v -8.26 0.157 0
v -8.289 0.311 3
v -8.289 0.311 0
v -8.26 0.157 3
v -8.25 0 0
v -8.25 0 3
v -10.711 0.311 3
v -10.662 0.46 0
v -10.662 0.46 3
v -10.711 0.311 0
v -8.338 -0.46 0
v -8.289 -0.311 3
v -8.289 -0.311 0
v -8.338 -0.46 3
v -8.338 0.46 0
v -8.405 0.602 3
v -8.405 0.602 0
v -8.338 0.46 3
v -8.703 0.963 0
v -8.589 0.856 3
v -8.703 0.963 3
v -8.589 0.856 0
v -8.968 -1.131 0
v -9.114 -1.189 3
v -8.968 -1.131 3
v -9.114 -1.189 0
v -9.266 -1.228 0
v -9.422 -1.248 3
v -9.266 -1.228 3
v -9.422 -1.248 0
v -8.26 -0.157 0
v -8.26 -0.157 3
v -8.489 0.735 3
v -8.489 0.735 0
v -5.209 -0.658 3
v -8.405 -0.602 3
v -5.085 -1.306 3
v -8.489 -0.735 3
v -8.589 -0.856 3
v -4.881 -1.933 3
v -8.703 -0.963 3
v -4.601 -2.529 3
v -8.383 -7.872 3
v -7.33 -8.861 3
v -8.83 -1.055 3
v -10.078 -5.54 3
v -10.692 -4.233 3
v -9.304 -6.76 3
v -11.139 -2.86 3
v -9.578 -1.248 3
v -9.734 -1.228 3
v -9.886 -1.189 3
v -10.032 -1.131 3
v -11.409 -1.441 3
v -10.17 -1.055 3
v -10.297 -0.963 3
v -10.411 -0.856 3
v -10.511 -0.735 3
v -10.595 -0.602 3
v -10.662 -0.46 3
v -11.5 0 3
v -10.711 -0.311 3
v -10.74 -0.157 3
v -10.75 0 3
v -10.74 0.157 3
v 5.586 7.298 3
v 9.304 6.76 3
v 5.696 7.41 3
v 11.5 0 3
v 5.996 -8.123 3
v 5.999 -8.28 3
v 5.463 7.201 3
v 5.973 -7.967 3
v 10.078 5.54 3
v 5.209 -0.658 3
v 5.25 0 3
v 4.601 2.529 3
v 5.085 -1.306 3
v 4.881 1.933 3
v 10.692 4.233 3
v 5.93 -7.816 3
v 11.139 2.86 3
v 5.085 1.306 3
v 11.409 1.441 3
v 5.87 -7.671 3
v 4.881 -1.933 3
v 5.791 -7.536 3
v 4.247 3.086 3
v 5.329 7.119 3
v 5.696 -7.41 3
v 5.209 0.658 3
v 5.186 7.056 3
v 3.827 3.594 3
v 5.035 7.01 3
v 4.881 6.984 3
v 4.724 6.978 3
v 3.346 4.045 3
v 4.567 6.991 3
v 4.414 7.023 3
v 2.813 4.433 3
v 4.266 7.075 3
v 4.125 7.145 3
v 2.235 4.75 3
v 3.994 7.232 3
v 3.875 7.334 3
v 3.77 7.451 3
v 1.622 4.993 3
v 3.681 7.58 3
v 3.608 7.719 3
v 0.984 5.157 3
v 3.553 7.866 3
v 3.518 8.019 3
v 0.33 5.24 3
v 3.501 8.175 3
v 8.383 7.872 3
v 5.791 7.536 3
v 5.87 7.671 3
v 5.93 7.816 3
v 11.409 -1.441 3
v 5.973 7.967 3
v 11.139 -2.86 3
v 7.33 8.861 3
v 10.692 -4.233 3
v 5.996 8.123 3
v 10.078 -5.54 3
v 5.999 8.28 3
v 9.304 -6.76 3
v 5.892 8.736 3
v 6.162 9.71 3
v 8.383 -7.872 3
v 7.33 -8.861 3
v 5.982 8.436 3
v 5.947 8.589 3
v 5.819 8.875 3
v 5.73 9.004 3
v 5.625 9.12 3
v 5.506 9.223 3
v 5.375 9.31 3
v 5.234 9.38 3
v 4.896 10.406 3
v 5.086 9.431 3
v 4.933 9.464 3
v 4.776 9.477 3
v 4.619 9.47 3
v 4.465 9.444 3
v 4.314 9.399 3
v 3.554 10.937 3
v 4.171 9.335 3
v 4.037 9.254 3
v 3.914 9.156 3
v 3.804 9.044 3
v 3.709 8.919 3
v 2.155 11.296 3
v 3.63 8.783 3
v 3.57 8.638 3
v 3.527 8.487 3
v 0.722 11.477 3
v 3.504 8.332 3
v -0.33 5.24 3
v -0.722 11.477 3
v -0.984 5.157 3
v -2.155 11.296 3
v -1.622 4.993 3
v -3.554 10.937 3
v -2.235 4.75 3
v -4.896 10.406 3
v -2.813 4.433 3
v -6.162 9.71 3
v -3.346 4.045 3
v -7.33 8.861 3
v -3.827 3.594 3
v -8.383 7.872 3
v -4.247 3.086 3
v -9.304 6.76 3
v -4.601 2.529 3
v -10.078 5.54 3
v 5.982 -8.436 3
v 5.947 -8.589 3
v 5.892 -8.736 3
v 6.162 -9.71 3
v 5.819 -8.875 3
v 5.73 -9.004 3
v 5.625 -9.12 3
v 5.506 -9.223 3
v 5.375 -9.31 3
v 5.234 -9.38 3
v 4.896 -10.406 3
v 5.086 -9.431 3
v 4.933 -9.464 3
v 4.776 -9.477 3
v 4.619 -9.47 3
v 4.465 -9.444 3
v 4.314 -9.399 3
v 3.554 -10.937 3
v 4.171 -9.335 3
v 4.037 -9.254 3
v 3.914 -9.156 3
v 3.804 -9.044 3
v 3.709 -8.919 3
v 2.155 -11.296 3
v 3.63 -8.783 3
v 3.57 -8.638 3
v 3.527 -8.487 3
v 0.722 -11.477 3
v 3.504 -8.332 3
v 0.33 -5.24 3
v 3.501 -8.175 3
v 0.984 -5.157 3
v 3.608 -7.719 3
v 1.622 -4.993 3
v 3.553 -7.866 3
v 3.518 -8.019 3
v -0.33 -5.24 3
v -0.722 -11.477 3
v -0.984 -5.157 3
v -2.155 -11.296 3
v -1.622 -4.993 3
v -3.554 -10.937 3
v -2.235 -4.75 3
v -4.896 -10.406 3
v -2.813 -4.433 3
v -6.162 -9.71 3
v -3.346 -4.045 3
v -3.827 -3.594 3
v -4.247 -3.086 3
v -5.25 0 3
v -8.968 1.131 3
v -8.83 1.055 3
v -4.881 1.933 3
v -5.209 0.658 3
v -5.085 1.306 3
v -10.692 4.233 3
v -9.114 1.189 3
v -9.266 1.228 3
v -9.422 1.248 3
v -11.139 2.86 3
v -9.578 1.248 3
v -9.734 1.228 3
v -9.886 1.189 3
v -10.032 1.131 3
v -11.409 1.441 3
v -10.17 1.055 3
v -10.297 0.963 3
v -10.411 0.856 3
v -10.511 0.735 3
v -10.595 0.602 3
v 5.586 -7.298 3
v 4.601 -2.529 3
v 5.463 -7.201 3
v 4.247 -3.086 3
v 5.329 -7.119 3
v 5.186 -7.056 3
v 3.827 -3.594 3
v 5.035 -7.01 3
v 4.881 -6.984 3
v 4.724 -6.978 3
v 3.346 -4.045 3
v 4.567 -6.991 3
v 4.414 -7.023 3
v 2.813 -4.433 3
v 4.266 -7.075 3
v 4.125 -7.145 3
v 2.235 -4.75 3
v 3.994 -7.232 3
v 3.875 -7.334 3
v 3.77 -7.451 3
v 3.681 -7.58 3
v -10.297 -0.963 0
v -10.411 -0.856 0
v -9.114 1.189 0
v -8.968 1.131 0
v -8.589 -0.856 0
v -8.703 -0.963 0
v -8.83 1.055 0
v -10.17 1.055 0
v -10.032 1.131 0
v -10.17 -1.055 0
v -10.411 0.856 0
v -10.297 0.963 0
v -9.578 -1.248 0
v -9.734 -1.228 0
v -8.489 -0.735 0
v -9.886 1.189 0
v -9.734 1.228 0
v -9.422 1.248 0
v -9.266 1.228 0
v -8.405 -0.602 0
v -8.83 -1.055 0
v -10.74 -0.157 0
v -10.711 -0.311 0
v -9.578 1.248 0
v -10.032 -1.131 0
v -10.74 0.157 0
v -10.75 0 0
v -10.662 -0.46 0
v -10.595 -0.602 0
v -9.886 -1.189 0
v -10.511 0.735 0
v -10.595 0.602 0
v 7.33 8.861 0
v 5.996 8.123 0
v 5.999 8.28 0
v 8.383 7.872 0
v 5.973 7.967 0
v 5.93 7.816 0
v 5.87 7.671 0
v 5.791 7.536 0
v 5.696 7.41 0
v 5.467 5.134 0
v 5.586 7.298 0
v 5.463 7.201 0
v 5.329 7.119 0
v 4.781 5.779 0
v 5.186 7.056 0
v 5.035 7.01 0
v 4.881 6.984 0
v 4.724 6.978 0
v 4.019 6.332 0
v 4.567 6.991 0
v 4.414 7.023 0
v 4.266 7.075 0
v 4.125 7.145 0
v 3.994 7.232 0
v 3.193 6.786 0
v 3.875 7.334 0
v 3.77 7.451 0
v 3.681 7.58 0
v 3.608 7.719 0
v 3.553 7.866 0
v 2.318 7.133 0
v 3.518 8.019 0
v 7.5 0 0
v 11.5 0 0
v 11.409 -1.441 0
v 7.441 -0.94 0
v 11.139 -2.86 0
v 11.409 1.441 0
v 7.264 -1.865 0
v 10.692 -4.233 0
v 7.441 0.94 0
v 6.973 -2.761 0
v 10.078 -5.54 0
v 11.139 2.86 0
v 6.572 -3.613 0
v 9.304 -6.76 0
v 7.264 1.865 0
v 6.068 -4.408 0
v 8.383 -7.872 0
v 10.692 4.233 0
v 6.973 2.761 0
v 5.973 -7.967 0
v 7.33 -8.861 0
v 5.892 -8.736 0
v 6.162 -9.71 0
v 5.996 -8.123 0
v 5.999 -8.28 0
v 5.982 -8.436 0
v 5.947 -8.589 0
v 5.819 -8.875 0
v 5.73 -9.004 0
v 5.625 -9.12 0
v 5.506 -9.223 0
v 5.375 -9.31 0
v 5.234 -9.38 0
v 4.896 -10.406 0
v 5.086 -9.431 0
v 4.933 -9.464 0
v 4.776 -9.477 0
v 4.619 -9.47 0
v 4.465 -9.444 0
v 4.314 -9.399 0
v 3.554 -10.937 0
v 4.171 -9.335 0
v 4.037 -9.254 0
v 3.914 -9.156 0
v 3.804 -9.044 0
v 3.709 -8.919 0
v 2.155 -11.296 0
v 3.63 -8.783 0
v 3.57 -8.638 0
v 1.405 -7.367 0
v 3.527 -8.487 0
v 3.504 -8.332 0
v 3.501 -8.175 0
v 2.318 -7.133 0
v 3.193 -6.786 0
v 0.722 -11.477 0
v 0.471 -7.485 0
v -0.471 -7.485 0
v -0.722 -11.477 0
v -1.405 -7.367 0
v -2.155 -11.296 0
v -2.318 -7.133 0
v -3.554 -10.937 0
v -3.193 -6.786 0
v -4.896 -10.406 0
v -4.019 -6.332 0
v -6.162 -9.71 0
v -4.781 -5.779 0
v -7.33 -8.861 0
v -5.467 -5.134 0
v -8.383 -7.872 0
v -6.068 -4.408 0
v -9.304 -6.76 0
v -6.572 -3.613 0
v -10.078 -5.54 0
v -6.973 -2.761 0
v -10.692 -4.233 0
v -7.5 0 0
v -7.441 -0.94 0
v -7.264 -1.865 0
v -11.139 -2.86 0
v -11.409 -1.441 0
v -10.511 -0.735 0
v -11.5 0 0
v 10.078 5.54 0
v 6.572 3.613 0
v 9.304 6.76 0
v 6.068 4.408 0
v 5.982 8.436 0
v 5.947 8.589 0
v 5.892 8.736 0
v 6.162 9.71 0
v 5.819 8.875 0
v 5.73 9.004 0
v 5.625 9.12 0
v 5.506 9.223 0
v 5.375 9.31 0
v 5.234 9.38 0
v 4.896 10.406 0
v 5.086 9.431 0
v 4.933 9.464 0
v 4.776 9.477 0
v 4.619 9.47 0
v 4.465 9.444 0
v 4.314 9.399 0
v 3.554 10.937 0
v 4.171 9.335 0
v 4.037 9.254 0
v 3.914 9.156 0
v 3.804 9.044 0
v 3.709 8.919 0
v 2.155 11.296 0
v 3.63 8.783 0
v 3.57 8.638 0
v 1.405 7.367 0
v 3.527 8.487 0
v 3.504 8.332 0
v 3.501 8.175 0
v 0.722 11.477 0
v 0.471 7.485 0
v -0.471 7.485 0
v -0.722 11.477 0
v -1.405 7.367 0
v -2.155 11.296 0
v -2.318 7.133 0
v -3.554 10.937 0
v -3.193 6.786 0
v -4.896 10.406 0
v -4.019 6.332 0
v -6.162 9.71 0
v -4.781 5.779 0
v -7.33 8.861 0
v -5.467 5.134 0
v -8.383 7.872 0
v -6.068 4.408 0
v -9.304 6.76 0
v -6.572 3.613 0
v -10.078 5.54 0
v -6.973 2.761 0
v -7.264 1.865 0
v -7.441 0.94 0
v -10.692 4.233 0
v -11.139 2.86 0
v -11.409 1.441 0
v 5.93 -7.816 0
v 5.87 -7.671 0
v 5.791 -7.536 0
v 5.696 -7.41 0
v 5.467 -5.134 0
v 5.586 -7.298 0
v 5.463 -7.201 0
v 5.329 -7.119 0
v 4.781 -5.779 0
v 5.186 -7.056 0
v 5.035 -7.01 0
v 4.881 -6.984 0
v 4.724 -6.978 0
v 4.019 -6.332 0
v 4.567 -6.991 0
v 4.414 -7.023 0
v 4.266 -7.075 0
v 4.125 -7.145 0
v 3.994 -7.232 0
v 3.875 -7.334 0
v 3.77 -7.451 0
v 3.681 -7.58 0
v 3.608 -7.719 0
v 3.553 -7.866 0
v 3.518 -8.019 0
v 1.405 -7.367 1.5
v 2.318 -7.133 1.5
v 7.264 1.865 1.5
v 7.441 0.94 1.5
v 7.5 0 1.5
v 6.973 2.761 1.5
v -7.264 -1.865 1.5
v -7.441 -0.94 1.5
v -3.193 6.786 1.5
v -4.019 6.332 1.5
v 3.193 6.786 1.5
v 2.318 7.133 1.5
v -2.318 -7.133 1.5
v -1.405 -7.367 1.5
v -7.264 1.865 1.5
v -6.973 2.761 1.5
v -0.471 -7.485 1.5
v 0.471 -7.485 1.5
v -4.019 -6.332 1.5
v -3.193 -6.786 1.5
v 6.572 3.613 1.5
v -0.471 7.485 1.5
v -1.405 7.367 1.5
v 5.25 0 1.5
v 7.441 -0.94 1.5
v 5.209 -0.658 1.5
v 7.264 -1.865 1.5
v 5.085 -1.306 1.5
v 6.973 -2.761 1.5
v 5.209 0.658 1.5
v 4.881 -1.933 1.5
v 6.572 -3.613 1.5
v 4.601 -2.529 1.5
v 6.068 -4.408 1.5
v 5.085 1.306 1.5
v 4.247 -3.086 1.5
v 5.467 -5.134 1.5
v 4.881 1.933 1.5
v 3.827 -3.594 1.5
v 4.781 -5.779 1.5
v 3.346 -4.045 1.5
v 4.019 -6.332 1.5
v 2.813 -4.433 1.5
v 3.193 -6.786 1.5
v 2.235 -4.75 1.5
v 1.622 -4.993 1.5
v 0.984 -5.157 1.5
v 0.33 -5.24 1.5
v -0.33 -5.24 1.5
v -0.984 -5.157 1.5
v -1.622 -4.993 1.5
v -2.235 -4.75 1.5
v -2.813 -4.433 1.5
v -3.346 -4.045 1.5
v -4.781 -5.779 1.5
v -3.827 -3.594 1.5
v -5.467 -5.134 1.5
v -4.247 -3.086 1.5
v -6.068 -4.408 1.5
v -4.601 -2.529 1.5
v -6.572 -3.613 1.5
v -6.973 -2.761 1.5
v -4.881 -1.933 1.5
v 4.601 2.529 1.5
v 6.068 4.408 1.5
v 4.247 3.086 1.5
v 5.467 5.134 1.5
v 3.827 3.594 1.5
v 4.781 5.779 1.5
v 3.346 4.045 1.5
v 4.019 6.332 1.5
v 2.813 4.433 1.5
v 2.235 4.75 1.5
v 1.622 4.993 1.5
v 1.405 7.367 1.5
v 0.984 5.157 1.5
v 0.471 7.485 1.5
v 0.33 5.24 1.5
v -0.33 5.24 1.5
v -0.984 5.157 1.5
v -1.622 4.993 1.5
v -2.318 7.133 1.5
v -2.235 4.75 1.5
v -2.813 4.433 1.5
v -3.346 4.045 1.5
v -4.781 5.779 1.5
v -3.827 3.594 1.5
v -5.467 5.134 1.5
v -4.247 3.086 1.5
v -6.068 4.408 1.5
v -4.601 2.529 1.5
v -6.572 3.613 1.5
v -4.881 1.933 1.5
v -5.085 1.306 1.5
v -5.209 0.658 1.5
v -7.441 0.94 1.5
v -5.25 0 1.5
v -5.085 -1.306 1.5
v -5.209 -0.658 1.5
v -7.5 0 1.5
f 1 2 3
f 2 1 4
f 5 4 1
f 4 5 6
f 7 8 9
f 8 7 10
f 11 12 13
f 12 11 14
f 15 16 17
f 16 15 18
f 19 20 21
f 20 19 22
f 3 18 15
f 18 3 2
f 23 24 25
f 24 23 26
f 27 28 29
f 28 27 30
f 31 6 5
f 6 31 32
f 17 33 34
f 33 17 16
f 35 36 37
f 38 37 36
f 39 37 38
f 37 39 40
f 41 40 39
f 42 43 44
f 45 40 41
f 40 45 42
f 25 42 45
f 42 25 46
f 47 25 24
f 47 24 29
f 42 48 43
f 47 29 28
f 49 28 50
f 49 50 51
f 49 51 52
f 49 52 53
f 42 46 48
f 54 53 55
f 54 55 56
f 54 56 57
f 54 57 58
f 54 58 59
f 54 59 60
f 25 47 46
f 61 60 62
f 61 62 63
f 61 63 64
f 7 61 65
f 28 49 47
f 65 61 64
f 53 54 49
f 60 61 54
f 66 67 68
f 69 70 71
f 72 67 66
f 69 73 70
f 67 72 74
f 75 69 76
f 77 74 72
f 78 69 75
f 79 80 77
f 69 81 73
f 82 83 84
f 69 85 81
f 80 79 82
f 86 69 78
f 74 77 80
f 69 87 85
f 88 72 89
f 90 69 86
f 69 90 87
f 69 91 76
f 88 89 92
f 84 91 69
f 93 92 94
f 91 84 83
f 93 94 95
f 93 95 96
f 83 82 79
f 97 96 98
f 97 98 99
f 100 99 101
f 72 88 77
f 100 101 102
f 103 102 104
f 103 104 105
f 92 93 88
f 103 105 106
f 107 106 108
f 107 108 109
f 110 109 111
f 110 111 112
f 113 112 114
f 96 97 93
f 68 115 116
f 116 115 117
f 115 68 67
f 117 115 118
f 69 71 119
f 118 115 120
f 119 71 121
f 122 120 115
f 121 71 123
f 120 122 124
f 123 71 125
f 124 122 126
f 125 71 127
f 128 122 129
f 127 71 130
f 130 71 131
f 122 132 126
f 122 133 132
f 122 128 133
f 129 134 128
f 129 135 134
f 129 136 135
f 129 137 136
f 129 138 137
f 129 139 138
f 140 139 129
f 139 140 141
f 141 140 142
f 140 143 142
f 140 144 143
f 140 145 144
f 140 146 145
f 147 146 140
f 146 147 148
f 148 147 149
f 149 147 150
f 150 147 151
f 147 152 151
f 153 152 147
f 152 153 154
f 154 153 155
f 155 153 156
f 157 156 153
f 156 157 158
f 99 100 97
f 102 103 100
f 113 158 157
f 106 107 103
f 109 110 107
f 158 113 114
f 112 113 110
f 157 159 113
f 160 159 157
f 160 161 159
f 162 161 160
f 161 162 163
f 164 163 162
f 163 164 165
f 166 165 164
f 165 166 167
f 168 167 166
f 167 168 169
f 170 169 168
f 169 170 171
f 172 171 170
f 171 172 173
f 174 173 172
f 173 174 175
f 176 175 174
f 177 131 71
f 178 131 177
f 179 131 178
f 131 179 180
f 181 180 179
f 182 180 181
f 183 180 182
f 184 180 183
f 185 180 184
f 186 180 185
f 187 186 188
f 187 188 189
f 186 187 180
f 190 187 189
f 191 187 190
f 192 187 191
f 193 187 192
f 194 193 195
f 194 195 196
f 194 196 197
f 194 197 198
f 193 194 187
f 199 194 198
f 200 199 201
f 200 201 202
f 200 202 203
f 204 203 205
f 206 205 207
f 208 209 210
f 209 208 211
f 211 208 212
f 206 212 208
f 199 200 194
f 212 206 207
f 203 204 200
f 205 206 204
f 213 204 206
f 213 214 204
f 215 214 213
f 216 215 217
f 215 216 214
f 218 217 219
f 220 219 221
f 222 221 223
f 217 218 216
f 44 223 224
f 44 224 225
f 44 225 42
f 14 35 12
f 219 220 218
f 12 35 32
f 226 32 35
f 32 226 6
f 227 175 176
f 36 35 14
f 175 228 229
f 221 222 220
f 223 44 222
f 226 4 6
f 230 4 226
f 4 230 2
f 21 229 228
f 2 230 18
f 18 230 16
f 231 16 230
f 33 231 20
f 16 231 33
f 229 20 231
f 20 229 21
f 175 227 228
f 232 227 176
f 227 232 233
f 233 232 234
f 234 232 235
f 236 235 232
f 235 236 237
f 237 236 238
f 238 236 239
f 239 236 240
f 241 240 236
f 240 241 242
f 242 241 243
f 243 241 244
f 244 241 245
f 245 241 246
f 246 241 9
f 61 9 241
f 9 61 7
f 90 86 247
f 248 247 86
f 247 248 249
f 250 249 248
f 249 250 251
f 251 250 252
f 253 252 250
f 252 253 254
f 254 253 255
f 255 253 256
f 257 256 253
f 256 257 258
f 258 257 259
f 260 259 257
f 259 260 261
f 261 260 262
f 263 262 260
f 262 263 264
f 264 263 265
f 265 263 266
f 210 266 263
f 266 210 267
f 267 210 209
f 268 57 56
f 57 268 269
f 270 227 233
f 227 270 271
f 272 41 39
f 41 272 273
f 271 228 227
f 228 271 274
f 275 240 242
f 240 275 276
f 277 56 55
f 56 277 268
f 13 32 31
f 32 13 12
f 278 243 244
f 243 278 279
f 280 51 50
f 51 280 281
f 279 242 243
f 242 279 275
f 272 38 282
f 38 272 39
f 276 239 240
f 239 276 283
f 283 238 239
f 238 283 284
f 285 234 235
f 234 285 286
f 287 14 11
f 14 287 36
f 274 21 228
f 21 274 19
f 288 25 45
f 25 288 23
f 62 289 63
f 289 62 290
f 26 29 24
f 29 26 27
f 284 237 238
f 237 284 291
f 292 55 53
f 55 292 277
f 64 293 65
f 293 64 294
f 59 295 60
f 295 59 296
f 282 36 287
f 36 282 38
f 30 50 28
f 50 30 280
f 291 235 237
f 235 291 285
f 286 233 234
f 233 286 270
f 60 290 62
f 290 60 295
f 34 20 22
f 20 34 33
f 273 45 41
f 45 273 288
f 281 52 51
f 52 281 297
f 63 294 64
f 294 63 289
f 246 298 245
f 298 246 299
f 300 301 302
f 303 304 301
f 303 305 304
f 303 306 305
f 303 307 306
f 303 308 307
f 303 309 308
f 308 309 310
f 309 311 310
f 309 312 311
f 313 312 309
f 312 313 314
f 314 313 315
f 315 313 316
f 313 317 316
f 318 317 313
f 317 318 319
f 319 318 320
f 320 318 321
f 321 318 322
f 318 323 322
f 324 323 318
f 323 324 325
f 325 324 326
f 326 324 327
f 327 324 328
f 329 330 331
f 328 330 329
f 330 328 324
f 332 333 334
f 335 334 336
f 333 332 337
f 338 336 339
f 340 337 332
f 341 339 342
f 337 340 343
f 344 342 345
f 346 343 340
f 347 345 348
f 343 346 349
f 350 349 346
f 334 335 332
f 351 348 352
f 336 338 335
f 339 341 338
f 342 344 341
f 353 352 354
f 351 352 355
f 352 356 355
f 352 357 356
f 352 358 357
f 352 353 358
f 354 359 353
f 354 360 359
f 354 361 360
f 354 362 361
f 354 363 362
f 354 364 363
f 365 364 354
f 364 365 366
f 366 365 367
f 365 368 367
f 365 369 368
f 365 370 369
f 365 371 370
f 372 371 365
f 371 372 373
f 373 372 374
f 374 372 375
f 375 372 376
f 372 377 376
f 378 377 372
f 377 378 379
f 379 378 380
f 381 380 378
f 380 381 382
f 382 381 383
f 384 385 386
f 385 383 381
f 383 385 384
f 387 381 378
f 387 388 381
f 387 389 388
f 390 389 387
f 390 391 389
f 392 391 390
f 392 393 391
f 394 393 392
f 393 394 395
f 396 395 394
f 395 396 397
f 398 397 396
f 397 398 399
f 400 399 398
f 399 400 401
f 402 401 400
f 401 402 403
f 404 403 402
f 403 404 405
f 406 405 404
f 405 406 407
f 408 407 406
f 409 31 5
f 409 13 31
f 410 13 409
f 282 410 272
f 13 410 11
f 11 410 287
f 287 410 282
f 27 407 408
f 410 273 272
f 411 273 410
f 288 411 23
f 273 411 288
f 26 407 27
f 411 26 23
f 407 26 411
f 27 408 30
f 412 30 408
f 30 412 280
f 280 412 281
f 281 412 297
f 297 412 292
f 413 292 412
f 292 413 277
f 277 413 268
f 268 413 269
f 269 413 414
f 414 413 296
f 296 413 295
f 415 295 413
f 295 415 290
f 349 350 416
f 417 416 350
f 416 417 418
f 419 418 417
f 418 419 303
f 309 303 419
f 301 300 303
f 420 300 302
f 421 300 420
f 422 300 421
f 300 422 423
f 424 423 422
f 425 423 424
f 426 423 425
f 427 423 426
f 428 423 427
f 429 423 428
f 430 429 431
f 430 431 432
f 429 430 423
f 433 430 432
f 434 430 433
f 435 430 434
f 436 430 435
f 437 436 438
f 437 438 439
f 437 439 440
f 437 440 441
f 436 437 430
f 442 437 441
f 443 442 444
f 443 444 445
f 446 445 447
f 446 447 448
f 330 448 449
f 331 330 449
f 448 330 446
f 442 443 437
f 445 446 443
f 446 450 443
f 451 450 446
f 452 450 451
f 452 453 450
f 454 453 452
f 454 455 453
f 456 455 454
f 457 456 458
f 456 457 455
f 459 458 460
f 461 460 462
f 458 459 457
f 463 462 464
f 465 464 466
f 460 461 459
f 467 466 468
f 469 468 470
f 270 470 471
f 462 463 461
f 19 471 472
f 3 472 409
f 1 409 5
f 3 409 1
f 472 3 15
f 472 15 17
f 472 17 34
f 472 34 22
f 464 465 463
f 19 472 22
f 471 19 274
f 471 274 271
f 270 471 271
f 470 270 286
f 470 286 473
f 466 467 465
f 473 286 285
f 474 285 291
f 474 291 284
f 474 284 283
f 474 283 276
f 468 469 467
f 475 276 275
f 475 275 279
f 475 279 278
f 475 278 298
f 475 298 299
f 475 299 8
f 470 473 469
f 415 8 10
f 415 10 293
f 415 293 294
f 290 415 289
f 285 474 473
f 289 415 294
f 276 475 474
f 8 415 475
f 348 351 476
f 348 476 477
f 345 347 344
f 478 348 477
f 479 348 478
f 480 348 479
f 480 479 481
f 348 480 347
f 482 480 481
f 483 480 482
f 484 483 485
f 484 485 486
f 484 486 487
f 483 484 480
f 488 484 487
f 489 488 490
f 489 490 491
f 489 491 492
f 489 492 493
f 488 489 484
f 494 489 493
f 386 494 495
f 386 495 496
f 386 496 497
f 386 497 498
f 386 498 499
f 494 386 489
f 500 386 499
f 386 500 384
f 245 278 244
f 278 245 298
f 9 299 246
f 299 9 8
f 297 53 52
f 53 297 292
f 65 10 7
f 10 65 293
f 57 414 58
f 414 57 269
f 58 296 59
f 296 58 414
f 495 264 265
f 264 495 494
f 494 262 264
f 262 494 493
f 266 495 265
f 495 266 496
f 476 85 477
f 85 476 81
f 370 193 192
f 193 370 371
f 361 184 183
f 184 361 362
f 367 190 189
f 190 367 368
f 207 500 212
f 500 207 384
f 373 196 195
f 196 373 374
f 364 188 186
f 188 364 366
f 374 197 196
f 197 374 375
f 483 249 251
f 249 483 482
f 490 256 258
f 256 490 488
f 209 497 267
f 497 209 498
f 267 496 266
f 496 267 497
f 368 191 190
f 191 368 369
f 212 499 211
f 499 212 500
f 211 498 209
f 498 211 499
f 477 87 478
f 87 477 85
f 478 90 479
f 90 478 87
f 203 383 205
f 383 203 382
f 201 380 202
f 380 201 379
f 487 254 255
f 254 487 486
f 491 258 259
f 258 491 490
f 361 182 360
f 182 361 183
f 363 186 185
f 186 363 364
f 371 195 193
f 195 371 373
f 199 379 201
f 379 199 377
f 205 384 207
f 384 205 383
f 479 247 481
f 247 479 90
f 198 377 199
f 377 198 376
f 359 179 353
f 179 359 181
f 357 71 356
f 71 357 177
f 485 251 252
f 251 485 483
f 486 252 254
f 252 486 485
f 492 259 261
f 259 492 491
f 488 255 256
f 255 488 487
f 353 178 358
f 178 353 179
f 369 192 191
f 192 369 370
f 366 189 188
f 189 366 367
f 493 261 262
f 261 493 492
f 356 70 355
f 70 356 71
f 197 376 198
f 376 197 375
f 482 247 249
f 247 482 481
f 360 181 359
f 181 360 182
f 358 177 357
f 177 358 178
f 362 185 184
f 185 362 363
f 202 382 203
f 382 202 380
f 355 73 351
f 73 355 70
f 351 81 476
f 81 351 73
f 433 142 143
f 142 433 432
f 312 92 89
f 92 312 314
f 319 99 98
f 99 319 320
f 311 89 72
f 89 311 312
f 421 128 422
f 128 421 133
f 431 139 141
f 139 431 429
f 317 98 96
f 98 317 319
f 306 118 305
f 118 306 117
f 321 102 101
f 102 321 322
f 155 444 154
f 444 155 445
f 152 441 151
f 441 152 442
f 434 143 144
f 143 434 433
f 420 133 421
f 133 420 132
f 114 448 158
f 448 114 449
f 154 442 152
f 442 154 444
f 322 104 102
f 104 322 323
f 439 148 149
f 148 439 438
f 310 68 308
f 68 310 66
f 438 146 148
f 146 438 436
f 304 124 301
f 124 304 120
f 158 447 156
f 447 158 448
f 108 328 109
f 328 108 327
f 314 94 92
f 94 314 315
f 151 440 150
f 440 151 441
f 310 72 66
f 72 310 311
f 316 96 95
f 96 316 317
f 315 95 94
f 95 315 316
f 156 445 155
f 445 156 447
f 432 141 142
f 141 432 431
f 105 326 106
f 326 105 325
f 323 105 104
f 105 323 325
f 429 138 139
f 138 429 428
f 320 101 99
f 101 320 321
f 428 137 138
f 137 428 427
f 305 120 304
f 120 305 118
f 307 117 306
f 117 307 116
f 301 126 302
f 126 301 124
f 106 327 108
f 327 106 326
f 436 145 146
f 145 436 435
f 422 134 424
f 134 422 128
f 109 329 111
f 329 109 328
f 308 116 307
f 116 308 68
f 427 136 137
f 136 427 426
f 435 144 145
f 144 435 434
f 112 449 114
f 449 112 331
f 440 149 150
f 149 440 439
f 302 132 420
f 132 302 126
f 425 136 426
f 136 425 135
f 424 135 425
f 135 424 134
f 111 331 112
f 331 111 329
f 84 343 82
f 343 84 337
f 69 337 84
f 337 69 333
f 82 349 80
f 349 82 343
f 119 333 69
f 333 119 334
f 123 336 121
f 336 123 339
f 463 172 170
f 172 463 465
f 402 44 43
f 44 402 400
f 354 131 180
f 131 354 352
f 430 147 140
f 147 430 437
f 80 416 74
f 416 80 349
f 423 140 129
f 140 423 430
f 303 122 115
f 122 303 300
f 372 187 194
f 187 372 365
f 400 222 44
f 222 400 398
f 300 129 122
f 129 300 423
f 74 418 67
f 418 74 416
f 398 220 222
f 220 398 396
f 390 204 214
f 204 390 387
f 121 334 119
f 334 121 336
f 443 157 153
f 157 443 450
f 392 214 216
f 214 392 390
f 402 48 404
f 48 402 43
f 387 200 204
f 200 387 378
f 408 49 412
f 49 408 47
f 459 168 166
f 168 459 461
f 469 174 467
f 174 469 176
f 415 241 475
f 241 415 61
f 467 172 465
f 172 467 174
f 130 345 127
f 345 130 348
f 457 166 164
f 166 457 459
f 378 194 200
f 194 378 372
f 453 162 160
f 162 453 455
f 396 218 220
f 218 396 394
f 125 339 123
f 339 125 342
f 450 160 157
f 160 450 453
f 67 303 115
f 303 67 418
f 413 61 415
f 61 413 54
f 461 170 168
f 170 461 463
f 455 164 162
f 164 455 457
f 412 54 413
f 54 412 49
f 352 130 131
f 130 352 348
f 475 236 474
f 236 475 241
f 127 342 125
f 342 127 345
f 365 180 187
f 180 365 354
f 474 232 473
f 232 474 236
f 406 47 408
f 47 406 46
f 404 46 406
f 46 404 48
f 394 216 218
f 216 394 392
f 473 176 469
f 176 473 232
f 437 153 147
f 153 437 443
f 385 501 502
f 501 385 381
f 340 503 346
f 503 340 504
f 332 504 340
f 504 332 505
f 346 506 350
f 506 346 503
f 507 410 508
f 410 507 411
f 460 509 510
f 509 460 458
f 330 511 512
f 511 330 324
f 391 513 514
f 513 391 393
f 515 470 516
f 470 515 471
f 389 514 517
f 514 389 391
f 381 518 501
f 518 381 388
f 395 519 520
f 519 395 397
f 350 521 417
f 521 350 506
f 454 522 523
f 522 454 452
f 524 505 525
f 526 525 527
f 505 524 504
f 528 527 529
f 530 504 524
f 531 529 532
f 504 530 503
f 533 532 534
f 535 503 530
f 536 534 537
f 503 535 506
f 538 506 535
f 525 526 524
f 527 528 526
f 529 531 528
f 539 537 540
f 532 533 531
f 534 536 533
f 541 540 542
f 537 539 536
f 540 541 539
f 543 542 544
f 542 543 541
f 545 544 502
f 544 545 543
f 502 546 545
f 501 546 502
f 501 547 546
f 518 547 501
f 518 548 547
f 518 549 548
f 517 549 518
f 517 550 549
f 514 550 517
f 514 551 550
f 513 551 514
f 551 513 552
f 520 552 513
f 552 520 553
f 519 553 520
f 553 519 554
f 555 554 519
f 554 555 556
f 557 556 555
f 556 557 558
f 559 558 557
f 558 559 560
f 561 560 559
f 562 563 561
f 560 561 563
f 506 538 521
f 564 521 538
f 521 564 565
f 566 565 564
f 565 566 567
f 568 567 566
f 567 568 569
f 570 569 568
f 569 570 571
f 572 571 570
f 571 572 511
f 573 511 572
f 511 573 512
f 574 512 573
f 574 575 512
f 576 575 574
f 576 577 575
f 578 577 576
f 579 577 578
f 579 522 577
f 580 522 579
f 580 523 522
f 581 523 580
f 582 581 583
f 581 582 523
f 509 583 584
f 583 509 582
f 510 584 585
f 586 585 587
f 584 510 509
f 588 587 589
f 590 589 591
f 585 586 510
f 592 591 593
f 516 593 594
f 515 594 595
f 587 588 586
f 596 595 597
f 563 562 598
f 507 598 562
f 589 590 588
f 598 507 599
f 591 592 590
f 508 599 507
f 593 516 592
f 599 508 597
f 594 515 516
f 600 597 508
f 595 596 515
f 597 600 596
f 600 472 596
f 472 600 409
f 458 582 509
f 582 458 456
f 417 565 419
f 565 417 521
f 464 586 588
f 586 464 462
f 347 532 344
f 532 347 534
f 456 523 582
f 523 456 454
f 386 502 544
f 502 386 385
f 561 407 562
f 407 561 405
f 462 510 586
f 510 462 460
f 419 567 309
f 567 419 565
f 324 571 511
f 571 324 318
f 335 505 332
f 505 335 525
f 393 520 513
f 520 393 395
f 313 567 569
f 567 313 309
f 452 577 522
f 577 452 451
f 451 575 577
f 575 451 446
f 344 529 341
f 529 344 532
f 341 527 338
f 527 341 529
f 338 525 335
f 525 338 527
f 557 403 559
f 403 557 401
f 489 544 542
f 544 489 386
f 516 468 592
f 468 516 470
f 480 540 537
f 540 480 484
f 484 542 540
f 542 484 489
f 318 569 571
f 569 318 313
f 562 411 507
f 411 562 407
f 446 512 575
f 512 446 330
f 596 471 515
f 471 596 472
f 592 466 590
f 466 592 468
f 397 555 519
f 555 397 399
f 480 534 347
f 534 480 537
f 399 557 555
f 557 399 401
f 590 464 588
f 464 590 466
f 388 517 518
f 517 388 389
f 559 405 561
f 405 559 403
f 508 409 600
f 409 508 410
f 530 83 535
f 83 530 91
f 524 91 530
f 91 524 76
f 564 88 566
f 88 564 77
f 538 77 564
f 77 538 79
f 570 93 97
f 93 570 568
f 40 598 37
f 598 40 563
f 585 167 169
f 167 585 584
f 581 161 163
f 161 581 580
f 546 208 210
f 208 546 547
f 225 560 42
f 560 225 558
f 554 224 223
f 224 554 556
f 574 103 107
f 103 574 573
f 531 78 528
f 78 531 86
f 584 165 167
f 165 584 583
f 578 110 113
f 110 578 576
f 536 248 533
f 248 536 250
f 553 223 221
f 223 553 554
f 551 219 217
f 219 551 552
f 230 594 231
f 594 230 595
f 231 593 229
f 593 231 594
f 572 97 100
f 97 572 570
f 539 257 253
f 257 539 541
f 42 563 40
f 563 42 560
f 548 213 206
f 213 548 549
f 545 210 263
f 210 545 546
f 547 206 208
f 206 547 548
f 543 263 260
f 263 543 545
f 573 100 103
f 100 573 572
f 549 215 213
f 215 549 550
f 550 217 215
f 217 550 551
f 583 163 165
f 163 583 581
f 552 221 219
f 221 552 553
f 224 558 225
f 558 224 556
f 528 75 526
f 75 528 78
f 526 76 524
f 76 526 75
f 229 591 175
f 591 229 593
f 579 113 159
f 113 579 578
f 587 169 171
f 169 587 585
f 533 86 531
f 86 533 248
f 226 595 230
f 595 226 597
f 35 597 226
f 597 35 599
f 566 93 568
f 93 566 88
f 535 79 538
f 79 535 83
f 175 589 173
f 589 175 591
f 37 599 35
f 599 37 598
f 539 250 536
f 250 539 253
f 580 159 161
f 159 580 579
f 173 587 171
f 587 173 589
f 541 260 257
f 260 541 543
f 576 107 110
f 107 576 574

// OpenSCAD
FILTER_DIA = 10.5;
FILTER_BASE_DIA = 15;
FILTER_BASE_HEIGHT = 1.5;

PEGS = 3;
PEG_DIA = 2.5;
PEG_SPACING_RADIUS = 9.5;
PEG_HEIGHT = 3;

ADAPTER_DIA = 23;
ADAPTER_HEIGHT = 3;

$fn = 50;

module adapter() {
  difference() {
    cylinder(d = ADAPTER_DIA, h = ADAPTER_HEIGHT);
    cylinder(d = FILTER_BASE_DIA, h = FILTER_BASE_HEIGHT);
    cylinder(d = FILTER_DIA, h = ADAPTER_HEIGHT);
    
    for(i = [0:PEGS]) {
      rotate([0, 0, i * 360/PEGS])
      translate([-PEG_SPACING_RADIUS, 0, 0])
      cylinder(d = PEG_DIA, h = PEG_HEIGHT);
    }
  }
}

adapter();
